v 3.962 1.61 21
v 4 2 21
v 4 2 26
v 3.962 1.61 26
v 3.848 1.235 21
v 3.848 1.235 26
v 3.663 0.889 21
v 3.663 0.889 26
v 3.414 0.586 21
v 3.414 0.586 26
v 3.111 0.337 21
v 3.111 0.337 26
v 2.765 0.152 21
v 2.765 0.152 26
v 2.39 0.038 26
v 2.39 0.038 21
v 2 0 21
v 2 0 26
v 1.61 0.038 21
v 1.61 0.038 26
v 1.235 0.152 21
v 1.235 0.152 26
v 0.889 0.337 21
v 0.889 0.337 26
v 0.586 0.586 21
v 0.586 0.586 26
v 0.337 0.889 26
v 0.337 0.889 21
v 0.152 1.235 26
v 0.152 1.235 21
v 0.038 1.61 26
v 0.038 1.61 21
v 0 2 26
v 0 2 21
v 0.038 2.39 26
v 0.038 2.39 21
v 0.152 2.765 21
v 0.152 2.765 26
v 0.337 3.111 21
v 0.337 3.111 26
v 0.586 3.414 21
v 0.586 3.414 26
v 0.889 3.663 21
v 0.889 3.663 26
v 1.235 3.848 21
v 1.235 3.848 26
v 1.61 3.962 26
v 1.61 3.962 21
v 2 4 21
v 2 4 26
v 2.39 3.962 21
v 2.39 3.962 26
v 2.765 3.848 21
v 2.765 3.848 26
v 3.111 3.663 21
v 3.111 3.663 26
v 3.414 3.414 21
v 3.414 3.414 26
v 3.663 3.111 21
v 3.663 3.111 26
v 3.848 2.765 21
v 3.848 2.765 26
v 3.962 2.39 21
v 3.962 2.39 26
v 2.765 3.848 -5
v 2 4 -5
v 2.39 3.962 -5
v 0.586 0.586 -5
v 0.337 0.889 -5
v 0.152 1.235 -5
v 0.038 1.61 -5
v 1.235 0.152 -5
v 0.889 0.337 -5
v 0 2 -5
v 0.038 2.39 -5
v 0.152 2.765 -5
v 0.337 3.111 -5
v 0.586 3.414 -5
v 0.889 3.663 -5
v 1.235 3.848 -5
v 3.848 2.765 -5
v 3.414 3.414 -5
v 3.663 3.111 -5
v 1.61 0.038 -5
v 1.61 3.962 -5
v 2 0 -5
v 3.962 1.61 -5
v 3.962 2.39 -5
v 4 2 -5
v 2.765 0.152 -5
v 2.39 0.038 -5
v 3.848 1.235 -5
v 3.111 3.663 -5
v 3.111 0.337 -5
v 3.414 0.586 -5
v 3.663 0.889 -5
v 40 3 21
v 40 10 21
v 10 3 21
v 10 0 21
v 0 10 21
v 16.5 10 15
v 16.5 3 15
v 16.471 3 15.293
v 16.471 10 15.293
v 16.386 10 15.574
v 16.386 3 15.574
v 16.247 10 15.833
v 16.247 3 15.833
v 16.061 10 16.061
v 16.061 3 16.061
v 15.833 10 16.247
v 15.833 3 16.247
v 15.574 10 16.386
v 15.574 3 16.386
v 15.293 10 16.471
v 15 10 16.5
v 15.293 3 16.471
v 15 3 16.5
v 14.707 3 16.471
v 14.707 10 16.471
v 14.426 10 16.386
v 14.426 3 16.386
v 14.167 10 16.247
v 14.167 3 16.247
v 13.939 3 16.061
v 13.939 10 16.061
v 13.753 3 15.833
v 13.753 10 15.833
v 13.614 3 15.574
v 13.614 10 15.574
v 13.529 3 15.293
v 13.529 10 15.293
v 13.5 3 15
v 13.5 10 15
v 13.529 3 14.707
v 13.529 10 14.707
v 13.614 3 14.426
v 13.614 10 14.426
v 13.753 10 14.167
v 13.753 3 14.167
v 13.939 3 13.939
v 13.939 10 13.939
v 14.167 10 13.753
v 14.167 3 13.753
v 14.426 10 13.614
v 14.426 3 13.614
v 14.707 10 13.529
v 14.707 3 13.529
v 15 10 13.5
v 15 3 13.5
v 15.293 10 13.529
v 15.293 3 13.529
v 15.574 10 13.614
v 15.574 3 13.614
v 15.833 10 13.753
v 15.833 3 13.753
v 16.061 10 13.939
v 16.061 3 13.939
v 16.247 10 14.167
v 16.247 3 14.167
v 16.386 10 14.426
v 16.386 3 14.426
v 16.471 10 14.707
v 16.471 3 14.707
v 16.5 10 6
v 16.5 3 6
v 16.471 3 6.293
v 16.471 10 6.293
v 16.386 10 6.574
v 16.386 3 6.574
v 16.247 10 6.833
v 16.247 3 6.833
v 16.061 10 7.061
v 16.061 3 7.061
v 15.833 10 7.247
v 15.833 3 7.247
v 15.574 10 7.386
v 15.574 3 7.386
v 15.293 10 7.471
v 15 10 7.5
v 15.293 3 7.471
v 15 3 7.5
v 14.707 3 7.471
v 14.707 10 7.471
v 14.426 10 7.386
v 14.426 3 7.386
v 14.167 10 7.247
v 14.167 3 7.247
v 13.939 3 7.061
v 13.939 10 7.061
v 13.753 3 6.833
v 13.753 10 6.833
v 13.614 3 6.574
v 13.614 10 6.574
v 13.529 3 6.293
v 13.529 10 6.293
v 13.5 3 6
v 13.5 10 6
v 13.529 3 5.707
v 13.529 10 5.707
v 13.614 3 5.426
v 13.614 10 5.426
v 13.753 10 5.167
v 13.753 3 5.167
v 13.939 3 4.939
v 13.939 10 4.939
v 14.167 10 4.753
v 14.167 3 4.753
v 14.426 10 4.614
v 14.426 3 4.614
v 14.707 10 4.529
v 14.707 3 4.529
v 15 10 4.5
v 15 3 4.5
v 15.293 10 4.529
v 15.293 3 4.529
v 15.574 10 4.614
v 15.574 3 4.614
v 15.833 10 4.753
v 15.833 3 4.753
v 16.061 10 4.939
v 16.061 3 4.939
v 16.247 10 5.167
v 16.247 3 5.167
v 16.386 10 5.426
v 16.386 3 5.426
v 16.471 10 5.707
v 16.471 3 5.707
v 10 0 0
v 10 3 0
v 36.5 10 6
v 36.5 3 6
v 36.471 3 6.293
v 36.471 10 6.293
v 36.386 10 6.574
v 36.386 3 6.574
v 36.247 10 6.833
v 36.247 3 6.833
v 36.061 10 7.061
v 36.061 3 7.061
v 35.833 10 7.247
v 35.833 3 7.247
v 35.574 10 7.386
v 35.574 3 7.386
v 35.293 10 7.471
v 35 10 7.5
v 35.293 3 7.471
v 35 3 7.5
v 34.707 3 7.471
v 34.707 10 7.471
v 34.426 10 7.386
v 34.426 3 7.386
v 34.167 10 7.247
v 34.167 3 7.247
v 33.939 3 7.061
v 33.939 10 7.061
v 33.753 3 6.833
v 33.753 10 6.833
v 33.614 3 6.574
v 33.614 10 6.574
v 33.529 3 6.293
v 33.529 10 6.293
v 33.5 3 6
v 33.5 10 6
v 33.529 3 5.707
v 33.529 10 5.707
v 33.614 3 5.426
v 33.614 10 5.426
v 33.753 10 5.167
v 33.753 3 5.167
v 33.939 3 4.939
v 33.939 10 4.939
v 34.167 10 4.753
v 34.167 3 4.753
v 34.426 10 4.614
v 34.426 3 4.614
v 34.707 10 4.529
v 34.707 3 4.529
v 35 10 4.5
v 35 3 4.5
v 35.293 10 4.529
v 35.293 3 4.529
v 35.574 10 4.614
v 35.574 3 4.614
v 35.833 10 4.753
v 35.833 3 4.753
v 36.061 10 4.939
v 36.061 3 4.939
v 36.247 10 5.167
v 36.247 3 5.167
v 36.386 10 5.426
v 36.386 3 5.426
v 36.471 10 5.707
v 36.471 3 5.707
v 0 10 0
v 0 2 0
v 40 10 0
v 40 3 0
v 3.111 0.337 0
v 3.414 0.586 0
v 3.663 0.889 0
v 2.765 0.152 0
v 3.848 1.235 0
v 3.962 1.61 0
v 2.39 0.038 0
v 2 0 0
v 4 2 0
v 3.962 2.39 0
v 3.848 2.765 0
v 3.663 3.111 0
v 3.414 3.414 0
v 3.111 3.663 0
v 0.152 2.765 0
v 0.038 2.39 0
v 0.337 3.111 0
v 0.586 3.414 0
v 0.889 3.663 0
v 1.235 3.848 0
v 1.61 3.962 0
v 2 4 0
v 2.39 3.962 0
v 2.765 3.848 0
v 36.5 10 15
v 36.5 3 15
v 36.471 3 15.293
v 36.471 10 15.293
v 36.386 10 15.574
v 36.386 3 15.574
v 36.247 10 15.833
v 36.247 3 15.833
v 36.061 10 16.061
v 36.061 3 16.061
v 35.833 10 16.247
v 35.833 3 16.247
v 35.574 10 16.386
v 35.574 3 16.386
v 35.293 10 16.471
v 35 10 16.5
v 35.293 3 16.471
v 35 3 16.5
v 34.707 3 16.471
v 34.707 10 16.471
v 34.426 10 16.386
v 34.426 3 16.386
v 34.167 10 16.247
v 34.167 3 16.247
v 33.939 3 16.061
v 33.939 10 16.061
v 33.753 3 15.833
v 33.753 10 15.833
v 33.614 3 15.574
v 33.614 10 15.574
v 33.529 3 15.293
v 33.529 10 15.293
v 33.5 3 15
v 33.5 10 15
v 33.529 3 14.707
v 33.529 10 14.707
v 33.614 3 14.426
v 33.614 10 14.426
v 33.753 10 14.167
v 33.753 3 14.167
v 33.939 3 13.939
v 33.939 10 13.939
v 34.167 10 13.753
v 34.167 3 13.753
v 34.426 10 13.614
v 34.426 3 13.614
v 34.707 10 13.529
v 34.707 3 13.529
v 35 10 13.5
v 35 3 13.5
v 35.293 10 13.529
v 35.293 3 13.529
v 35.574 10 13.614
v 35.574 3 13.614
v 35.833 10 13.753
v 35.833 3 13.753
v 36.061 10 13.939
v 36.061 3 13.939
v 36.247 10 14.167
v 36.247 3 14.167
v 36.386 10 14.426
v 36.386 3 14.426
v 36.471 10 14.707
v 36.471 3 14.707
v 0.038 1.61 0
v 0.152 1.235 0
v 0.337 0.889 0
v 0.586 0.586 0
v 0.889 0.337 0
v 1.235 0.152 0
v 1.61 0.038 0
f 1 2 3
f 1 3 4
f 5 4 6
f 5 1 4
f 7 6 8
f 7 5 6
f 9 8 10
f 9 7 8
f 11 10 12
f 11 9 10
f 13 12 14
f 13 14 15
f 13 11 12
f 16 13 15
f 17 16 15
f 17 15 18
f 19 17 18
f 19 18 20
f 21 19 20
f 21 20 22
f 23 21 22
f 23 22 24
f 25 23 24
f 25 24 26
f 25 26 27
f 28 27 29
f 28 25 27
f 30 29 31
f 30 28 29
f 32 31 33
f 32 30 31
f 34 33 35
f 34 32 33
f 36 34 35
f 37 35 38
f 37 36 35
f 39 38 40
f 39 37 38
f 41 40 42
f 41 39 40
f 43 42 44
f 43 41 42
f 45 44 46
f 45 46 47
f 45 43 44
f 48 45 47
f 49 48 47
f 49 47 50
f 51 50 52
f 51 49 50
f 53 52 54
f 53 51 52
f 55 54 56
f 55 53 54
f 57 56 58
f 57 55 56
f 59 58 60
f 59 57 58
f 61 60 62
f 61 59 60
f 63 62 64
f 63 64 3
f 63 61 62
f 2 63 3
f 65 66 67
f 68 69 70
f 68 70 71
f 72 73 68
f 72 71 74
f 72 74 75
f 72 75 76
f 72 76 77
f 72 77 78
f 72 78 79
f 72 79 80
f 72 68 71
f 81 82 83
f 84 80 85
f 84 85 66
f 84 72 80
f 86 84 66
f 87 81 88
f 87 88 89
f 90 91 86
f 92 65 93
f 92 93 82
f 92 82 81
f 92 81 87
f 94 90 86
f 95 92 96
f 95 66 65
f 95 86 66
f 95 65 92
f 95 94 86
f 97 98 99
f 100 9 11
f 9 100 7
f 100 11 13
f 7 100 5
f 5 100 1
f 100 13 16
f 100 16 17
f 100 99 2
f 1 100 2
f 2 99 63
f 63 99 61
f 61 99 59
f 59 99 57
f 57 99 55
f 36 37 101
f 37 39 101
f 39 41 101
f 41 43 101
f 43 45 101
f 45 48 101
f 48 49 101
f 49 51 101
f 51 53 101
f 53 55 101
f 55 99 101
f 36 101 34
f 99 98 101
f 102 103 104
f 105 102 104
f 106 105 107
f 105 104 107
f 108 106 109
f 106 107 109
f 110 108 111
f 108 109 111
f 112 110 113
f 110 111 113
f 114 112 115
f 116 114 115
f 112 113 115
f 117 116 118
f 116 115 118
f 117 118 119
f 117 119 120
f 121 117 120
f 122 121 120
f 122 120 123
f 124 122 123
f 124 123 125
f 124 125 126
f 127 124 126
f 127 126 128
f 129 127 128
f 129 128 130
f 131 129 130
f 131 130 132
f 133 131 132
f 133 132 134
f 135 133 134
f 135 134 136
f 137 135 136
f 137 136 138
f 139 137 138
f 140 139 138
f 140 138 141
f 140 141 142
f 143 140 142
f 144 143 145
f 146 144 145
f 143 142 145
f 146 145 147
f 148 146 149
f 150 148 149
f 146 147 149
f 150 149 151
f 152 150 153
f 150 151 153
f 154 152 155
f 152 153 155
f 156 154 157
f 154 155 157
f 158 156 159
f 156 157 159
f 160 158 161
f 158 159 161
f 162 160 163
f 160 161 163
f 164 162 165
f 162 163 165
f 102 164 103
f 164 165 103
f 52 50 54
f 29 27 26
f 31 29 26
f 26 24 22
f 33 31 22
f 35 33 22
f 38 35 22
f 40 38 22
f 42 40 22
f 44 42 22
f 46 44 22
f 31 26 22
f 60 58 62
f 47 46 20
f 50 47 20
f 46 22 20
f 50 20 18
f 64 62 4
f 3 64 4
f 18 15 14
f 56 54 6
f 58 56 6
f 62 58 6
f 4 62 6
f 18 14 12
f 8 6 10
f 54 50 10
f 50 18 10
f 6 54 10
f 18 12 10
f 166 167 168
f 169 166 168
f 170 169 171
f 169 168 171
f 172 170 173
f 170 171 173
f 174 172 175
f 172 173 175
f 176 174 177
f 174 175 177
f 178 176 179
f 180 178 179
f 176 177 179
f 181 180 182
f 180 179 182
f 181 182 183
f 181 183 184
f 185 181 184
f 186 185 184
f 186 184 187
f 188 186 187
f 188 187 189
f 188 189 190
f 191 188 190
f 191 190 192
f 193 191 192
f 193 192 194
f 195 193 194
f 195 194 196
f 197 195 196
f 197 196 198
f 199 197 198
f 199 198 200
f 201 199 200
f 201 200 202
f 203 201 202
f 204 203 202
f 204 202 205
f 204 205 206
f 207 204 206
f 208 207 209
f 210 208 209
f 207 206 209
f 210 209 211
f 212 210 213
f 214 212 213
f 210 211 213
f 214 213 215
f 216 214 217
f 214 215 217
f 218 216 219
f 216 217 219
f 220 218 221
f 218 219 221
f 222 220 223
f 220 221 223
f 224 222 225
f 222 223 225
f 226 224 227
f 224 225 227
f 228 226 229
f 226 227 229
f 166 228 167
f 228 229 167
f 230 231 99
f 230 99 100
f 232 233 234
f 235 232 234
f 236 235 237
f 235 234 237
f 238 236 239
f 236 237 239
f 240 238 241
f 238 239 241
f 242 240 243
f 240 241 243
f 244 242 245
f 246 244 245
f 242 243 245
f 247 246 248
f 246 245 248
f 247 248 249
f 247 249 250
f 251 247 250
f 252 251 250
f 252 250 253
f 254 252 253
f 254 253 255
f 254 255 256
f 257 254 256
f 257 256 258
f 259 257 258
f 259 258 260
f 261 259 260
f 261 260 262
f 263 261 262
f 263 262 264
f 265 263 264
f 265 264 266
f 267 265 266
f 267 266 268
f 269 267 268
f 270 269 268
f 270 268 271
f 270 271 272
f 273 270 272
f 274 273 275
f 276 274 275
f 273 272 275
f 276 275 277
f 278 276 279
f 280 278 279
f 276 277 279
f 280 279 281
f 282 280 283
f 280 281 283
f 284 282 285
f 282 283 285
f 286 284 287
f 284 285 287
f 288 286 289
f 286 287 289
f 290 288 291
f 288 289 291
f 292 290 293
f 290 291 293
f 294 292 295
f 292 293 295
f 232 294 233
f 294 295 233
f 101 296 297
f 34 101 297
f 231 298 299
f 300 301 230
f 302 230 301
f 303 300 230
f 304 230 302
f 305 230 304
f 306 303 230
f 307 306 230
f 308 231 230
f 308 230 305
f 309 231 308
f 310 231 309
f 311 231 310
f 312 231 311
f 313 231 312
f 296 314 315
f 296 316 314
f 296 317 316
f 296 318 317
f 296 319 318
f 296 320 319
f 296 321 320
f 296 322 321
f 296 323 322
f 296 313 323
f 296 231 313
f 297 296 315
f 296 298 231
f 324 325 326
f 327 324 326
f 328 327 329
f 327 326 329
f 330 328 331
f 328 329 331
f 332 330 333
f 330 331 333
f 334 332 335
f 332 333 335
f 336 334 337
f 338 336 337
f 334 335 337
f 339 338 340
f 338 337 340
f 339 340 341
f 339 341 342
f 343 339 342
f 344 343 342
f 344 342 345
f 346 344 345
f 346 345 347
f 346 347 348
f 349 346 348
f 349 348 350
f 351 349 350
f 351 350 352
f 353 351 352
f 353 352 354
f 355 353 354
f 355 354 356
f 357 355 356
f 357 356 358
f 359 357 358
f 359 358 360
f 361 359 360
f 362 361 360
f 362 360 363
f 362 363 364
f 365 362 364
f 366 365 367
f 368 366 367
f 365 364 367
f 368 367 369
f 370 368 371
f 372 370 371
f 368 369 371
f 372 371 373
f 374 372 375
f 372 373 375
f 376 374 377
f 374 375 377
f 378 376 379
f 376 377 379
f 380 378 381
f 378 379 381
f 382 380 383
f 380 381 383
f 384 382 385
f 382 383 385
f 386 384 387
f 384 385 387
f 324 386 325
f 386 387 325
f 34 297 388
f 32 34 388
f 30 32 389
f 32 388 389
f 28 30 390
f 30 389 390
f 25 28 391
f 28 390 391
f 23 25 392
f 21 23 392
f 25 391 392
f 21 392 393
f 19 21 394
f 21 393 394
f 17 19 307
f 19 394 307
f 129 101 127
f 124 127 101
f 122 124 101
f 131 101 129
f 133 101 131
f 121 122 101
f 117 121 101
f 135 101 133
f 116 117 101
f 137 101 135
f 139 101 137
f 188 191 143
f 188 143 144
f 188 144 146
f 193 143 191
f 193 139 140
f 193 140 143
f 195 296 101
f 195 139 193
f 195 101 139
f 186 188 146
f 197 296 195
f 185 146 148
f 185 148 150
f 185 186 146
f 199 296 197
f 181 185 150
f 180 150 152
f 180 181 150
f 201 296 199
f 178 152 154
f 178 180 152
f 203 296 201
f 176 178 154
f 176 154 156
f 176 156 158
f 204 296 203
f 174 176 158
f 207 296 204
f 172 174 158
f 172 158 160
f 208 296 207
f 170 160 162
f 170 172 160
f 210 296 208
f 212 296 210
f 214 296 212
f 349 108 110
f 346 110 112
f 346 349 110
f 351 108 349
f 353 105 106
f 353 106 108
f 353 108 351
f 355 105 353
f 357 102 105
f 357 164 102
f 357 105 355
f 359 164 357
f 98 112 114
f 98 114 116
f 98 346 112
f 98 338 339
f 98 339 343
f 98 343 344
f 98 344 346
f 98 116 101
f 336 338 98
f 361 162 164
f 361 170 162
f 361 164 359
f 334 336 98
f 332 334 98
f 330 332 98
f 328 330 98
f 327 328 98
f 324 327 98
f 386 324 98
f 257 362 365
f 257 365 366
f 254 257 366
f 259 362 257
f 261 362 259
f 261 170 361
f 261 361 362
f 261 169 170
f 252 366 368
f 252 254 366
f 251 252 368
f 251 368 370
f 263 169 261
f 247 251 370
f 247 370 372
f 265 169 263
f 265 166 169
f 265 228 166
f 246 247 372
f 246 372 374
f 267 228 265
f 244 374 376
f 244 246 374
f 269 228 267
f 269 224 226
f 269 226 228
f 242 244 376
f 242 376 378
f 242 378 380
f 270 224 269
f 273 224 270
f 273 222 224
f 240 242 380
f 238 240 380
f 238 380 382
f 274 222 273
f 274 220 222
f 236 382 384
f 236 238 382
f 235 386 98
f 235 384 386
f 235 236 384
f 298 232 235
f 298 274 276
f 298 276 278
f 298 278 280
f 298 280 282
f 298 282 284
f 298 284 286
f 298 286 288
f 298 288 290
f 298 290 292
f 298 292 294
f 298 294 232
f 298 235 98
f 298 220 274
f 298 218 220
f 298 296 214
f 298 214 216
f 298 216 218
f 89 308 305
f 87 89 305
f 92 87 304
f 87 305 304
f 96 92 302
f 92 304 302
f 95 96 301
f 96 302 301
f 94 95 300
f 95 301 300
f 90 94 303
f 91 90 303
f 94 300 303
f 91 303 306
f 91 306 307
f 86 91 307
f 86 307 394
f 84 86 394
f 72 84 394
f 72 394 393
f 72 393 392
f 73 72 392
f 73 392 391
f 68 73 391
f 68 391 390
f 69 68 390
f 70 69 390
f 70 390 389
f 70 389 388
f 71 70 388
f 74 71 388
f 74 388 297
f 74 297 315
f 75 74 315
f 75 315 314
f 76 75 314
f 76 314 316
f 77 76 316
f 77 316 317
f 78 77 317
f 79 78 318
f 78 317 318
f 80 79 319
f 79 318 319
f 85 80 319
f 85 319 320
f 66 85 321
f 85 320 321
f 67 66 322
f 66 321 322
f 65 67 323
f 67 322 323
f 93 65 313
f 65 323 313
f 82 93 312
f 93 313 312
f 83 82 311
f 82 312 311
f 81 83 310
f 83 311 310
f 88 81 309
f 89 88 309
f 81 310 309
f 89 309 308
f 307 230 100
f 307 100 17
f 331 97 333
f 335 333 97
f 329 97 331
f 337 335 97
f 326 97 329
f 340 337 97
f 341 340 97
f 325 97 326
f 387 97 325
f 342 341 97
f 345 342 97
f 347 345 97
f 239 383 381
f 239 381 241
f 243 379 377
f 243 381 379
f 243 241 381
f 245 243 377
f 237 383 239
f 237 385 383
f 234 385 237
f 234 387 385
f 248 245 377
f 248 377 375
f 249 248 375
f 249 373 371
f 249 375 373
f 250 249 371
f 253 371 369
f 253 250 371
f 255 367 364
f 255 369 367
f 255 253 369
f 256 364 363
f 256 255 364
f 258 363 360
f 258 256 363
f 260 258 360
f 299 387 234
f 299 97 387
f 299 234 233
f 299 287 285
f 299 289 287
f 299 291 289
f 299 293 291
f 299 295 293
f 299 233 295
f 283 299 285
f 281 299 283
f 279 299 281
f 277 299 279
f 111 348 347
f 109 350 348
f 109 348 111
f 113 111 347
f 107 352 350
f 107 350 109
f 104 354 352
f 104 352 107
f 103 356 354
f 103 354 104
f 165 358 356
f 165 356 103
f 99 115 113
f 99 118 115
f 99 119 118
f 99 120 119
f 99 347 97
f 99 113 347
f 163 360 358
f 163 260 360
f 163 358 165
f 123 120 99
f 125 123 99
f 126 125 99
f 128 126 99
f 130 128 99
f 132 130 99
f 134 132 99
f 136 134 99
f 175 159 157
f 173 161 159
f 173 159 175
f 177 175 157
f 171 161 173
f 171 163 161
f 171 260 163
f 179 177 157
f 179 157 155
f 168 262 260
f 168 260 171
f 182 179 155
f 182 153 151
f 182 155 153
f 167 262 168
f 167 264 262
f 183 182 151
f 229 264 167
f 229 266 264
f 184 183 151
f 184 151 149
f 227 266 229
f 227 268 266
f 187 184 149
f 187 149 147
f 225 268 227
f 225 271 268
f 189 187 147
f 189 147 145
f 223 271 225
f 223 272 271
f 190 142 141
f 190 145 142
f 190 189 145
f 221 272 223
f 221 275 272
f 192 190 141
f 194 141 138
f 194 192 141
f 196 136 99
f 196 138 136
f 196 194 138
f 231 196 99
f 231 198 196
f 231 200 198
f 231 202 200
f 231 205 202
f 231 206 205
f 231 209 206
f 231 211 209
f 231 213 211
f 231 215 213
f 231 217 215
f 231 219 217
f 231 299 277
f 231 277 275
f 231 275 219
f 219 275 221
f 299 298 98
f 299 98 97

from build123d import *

# Parameters (mm, degrees)
PAD_DEPTH         = 21
SKETCH001_R       = 2
PAD001_DEPTH      = 5
PAD001_DEPTH_BACK = 26
SKETCH002_R       = 1.5
POCKET_DEPTH      = 7.001


with BuildPart() as part:
    # Sketch → Pad (new body)
    with BuildSketch(Plane.XY):
        with BuildLine():
            Line((0, 10), (40, 10))
            Line((40, 10), (40, 3))
            Line((40, 3), (10, 3))
            Line((10, 3), (10, 0))
            Line((10, 0), (2, 0))
            ThreePointArc((0, 2), (0.585786, 0.585786), (2, 0))
            Line((0, 10), (0, 2))
        make_face()
    extrude(amount=PAD_DEPTH)

    # Sketch001 → Pad001 (new body, two sides)
    with BuildSketch(Plane(origin=(0, 0, 0), x_dir=(1, 0, 0), z_dir=(0, 0, -1))) as pad001_sk:
        with Locations((2, -2)):
            Circle(SKETCH001_R)
    extrude(amount=PAD001_DEPTH)
    extrude(pad001_sk.sketch, amount=-PAD001_DEPTH_BACK)

    # Sketch002 → Pocket (cut, through all)
    with BuildSketch(Plane.XZ.offset(-3)):
        with Locations((15, 15)):
            Circle(SKETCH002_R)
        with Locations((35, 15)):
            Circle(SKETCH002_R)
        with Locations((15, 6)):
            Circle(SKETCH002_R)
        with Locations((35, 6)):
            Circle(SKETCH002_R)
    extrude(amount=-POCKET_DEPTH, mode=Mode.SUBTRACT)


solid = part.part
